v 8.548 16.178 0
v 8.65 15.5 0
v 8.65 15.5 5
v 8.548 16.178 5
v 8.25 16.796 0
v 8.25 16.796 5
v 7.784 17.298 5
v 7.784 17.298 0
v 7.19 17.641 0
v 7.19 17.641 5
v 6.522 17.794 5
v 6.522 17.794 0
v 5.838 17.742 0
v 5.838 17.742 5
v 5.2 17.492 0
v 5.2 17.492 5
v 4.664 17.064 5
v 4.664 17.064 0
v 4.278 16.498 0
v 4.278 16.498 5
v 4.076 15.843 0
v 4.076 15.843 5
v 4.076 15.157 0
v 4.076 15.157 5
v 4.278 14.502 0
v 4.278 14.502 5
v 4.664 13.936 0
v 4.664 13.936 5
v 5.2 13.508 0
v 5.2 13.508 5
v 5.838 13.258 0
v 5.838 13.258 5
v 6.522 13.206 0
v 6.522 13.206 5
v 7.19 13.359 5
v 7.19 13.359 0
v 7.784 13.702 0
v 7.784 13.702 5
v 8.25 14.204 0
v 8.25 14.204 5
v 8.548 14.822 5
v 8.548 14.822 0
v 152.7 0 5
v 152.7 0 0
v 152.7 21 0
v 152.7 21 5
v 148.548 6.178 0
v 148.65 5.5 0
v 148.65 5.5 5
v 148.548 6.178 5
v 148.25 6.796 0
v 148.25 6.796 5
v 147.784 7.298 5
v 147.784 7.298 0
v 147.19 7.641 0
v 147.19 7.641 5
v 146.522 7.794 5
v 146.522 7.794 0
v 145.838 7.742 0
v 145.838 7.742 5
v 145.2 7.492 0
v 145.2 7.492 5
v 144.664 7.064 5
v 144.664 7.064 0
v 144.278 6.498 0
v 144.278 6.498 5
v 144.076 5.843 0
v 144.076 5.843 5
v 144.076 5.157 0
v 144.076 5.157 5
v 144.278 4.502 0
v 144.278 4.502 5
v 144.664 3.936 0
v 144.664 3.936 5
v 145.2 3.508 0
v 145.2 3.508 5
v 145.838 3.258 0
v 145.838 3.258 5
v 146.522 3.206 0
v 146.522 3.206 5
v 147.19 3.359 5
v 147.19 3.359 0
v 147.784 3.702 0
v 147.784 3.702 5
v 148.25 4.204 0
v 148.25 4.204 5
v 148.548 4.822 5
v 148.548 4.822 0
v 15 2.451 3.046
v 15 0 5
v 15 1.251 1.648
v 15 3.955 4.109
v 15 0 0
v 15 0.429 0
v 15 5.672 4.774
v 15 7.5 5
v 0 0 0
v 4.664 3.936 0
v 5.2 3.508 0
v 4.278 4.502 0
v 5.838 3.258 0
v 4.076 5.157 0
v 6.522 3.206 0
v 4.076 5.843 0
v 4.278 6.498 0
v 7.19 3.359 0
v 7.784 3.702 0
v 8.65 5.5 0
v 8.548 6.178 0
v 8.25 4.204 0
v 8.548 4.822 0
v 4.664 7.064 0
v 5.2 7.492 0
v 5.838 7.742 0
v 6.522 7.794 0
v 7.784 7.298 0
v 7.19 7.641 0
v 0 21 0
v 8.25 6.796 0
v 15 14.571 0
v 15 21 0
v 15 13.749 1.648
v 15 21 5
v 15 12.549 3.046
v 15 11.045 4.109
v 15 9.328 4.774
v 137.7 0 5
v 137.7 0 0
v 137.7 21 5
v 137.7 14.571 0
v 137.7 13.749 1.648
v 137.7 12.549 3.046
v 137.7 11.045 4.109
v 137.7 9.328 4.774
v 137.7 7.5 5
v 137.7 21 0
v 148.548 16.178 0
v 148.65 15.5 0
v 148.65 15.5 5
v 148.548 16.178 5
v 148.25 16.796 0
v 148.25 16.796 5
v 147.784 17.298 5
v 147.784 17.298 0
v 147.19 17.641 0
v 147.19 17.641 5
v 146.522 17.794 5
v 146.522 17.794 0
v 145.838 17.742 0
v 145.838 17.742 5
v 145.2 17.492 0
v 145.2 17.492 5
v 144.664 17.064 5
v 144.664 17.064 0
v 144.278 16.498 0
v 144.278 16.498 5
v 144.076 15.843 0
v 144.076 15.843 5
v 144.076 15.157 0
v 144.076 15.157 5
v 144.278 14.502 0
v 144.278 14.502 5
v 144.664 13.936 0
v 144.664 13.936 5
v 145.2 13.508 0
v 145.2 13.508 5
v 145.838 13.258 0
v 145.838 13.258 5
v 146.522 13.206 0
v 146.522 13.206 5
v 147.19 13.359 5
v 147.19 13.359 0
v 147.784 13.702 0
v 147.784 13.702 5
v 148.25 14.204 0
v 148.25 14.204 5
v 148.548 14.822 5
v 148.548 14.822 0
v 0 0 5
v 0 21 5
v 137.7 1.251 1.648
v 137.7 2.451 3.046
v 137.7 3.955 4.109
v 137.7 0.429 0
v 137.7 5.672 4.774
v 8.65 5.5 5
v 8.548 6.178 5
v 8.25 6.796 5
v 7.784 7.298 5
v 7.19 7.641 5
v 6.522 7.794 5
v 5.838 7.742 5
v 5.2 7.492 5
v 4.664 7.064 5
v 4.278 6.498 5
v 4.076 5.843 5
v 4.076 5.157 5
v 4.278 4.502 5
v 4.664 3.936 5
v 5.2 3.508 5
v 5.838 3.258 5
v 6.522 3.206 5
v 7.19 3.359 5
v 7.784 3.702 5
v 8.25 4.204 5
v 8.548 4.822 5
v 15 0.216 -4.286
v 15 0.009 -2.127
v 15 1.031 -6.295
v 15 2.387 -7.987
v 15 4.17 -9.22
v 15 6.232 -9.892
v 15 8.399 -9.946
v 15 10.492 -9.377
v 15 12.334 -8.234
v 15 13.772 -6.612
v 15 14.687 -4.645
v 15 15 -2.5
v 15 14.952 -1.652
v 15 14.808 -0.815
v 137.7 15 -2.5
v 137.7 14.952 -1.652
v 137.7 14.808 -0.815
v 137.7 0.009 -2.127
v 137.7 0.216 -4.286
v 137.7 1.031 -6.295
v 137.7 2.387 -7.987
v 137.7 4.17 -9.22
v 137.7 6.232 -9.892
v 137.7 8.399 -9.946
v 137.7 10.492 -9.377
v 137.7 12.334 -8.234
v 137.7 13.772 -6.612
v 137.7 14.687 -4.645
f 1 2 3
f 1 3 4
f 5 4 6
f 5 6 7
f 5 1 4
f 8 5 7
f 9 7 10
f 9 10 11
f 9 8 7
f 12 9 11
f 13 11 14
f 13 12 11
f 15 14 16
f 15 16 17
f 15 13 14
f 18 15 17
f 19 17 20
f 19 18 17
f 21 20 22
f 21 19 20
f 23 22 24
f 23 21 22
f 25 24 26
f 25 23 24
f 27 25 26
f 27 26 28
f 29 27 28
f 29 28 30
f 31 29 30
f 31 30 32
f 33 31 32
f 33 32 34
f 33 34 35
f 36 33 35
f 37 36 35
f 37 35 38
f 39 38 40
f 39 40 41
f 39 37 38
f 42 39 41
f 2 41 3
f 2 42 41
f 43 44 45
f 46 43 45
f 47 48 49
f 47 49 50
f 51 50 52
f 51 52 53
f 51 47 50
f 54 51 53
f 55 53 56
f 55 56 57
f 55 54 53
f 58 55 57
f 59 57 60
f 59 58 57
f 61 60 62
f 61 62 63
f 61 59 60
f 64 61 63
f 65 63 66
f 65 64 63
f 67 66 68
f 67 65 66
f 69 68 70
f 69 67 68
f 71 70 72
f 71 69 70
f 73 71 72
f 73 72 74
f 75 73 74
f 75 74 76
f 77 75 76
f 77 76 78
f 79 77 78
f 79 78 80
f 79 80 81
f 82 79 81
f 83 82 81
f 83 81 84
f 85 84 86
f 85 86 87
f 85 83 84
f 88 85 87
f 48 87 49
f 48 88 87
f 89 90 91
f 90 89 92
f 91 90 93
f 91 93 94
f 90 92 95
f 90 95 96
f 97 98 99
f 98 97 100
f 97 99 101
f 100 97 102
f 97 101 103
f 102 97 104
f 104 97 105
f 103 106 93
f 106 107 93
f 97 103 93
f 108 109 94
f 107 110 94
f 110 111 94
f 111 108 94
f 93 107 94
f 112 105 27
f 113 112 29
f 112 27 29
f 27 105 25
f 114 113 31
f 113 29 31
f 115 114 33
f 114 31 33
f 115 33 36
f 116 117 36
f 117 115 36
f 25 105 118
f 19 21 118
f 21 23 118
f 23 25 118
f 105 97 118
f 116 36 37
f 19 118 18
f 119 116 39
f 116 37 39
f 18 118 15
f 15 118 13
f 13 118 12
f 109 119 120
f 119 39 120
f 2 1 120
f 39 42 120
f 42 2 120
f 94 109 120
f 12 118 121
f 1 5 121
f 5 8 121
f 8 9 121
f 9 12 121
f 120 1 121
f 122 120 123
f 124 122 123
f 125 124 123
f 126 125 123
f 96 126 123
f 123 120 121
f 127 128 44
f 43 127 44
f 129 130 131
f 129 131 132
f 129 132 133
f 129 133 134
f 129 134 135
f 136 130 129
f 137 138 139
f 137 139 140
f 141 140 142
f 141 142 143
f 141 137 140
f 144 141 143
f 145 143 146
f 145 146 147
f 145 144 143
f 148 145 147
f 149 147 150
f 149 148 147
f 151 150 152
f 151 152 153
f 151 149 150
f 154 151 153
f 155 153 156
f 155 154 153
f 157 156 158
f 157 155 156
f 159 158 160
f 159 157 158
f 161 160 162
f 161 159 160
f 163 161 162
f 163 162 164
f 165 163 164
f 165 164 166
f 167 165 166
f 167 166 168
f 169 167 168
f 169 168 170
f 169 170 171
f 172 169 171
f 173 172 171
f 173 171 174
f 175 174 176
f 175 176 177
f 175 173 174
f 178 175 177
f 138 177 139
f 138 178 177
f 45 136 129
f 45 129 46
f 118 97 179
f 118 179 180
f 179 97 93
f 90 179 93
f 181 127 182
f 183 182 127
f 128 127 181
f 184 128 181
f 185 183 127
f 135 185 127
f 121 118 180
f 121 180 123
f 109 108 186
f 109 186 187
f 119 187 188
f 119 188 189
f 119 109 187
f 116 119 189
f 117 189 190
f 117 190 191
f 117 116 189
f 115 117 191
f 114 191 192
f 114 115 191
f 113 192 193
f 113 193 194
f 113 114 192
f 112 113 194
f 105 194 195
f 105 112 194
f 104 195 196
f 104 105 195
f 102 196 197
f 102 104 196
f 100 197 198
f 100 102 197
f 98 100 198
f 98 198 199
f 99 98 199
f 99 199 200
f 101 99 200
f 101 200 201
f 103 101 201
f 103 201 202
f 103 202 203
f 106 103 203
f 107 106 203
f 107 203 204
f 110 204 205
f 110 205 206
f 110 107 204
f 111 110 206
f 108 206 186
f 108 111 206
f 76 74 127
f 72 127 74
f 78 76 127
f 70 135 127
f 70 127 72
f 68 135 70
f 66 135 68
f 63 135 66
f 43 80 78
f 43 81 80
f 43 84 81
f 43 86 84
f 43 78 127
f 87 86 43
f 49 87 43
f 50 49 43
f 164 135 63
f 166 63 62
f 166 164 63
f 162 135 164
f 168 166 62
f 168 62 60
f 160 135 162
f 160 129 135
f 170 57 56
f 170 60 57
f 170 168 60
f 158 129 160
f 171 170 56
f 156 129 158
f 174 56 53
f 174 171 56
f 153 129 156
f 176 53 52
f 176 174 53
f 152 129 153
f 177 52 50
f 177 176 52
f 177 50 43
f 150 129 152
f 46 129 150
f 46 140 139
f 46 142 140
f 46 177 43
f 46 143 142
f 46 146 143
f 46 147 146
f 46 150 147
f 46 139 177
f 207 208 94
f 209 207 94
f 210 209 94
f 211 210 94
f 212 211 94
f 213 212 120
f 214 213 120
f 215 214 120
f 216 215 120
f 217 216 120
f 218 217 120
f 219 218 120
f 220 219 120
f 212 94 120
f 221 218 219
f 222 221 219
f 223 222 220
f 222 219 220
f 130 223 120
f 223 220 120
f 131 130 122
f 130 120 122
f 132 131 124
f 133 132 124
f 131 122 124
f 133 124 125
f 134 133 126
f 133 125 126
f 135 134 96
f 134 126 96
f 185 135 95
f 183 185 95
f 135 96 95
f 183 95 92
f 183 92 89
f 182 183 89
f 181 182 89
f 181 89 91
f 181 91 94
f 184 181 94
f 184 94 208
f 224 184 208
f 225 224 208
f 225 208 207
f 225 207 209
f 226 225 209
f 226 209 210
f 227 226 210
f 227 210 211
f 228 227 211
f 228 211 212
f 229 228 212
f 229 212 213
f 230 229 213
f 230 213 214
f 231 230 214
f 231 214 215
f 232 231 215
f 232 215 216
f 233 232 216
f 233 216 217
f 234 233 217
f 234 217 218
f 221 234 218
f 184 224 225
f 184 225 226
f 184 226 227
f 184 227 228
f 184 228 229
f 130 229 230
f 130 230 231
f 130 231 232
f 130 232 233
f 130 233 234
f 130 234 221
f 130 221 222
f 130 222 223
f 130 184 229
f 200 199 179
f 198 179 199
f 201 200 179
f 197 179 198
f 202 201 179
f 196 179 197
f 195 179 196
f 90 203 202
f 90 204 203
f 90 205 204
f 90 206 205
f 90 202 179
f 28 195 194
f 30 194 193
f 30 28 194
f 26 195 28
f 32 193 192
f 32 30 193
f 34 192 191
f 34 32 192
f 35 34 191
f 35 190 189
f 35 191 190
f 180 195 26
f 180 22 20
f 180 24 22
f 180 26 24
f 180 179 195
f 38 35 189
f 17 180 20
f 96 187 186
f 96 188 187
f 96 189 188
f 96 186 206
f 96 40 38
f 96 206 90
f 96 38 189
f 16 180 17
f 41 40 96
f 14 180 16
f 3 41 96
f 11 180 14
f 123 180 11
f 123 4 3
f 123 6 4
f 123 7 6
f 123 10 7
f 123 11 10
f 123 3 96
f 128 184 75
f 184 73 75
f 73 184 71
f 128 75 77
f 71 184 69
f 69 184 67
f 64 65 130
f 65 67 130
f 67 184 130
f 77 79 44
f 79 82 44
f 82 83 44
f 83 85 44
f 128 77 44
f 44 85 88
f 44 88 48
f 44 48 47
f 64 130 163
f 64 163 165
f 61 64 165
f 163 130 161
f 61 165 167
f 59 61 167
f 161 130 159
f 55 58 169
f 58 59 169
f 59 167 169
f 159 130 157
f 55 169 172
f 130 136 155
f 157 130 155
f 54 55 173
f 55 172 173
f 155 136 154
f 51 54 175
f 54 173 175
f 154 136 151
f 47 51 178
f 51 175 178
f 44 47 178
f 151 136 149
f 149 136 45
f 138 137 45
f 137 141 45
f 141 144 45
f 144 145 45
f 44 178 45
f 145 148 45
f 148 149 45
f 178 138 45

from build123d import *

# Parameters (mm, degrees)
SKETCH_W     = 15
SKETCH_H     = 21
SKETCH_R     = 2.3
PAD_DEPTH    = 5
SKETCH001_R  = 7.5
PAD001_DEPTH = 122.7
SKETCH002_W  = 15
SKETCH002_H  = 21
SKETCH002_R  = 2.3
PAD002_DEPTH = 5


with BuildPart() as part:
    # Sketch → Pad (new body)
    with BuildSketch(Plane.XY):
        with Locations((7.5, 10.5)):
            Rectangle(SKETCH_W, SKETCH_H)
        with Locations((6.35, 5.5)):
            Circle(SKETCH_R, mode=Mode.SUBTRACT)
        with Locations((6.35, 15.5)):
            Circle(SKETCH_R, mode=Mode.SUBTRACT)
    extrude(amount=PAD_DEPTH)

    # Sketch001 (on Face2 of Pad) → Pad001 (join)
    with BuildSketch(Plane.YZ.offset(15)):
        with Locations((7.5, -2.5)):
            Circle(SKETCH001_R)
    extrude(amount=PAD001_DEPTH)

    # Sketch002 → Pad002 (join)
    with BuildSketch(Plane.XY):
        with Locations((145.2, 10.5)):
            Rectangle(SKETCH002_W, SKETCH002_H)
        with Locations((146.35, 5.5)):
            Circle(SKETCH002_R, mode=Mode.SUBTRACT)
        with Locations((146.35, 15.5)):
            Circle(SKETCH002_R, mode=Mode.SUBTRACT)
    extrude(amount=PAD002_DEPTH)


solid = part.part
